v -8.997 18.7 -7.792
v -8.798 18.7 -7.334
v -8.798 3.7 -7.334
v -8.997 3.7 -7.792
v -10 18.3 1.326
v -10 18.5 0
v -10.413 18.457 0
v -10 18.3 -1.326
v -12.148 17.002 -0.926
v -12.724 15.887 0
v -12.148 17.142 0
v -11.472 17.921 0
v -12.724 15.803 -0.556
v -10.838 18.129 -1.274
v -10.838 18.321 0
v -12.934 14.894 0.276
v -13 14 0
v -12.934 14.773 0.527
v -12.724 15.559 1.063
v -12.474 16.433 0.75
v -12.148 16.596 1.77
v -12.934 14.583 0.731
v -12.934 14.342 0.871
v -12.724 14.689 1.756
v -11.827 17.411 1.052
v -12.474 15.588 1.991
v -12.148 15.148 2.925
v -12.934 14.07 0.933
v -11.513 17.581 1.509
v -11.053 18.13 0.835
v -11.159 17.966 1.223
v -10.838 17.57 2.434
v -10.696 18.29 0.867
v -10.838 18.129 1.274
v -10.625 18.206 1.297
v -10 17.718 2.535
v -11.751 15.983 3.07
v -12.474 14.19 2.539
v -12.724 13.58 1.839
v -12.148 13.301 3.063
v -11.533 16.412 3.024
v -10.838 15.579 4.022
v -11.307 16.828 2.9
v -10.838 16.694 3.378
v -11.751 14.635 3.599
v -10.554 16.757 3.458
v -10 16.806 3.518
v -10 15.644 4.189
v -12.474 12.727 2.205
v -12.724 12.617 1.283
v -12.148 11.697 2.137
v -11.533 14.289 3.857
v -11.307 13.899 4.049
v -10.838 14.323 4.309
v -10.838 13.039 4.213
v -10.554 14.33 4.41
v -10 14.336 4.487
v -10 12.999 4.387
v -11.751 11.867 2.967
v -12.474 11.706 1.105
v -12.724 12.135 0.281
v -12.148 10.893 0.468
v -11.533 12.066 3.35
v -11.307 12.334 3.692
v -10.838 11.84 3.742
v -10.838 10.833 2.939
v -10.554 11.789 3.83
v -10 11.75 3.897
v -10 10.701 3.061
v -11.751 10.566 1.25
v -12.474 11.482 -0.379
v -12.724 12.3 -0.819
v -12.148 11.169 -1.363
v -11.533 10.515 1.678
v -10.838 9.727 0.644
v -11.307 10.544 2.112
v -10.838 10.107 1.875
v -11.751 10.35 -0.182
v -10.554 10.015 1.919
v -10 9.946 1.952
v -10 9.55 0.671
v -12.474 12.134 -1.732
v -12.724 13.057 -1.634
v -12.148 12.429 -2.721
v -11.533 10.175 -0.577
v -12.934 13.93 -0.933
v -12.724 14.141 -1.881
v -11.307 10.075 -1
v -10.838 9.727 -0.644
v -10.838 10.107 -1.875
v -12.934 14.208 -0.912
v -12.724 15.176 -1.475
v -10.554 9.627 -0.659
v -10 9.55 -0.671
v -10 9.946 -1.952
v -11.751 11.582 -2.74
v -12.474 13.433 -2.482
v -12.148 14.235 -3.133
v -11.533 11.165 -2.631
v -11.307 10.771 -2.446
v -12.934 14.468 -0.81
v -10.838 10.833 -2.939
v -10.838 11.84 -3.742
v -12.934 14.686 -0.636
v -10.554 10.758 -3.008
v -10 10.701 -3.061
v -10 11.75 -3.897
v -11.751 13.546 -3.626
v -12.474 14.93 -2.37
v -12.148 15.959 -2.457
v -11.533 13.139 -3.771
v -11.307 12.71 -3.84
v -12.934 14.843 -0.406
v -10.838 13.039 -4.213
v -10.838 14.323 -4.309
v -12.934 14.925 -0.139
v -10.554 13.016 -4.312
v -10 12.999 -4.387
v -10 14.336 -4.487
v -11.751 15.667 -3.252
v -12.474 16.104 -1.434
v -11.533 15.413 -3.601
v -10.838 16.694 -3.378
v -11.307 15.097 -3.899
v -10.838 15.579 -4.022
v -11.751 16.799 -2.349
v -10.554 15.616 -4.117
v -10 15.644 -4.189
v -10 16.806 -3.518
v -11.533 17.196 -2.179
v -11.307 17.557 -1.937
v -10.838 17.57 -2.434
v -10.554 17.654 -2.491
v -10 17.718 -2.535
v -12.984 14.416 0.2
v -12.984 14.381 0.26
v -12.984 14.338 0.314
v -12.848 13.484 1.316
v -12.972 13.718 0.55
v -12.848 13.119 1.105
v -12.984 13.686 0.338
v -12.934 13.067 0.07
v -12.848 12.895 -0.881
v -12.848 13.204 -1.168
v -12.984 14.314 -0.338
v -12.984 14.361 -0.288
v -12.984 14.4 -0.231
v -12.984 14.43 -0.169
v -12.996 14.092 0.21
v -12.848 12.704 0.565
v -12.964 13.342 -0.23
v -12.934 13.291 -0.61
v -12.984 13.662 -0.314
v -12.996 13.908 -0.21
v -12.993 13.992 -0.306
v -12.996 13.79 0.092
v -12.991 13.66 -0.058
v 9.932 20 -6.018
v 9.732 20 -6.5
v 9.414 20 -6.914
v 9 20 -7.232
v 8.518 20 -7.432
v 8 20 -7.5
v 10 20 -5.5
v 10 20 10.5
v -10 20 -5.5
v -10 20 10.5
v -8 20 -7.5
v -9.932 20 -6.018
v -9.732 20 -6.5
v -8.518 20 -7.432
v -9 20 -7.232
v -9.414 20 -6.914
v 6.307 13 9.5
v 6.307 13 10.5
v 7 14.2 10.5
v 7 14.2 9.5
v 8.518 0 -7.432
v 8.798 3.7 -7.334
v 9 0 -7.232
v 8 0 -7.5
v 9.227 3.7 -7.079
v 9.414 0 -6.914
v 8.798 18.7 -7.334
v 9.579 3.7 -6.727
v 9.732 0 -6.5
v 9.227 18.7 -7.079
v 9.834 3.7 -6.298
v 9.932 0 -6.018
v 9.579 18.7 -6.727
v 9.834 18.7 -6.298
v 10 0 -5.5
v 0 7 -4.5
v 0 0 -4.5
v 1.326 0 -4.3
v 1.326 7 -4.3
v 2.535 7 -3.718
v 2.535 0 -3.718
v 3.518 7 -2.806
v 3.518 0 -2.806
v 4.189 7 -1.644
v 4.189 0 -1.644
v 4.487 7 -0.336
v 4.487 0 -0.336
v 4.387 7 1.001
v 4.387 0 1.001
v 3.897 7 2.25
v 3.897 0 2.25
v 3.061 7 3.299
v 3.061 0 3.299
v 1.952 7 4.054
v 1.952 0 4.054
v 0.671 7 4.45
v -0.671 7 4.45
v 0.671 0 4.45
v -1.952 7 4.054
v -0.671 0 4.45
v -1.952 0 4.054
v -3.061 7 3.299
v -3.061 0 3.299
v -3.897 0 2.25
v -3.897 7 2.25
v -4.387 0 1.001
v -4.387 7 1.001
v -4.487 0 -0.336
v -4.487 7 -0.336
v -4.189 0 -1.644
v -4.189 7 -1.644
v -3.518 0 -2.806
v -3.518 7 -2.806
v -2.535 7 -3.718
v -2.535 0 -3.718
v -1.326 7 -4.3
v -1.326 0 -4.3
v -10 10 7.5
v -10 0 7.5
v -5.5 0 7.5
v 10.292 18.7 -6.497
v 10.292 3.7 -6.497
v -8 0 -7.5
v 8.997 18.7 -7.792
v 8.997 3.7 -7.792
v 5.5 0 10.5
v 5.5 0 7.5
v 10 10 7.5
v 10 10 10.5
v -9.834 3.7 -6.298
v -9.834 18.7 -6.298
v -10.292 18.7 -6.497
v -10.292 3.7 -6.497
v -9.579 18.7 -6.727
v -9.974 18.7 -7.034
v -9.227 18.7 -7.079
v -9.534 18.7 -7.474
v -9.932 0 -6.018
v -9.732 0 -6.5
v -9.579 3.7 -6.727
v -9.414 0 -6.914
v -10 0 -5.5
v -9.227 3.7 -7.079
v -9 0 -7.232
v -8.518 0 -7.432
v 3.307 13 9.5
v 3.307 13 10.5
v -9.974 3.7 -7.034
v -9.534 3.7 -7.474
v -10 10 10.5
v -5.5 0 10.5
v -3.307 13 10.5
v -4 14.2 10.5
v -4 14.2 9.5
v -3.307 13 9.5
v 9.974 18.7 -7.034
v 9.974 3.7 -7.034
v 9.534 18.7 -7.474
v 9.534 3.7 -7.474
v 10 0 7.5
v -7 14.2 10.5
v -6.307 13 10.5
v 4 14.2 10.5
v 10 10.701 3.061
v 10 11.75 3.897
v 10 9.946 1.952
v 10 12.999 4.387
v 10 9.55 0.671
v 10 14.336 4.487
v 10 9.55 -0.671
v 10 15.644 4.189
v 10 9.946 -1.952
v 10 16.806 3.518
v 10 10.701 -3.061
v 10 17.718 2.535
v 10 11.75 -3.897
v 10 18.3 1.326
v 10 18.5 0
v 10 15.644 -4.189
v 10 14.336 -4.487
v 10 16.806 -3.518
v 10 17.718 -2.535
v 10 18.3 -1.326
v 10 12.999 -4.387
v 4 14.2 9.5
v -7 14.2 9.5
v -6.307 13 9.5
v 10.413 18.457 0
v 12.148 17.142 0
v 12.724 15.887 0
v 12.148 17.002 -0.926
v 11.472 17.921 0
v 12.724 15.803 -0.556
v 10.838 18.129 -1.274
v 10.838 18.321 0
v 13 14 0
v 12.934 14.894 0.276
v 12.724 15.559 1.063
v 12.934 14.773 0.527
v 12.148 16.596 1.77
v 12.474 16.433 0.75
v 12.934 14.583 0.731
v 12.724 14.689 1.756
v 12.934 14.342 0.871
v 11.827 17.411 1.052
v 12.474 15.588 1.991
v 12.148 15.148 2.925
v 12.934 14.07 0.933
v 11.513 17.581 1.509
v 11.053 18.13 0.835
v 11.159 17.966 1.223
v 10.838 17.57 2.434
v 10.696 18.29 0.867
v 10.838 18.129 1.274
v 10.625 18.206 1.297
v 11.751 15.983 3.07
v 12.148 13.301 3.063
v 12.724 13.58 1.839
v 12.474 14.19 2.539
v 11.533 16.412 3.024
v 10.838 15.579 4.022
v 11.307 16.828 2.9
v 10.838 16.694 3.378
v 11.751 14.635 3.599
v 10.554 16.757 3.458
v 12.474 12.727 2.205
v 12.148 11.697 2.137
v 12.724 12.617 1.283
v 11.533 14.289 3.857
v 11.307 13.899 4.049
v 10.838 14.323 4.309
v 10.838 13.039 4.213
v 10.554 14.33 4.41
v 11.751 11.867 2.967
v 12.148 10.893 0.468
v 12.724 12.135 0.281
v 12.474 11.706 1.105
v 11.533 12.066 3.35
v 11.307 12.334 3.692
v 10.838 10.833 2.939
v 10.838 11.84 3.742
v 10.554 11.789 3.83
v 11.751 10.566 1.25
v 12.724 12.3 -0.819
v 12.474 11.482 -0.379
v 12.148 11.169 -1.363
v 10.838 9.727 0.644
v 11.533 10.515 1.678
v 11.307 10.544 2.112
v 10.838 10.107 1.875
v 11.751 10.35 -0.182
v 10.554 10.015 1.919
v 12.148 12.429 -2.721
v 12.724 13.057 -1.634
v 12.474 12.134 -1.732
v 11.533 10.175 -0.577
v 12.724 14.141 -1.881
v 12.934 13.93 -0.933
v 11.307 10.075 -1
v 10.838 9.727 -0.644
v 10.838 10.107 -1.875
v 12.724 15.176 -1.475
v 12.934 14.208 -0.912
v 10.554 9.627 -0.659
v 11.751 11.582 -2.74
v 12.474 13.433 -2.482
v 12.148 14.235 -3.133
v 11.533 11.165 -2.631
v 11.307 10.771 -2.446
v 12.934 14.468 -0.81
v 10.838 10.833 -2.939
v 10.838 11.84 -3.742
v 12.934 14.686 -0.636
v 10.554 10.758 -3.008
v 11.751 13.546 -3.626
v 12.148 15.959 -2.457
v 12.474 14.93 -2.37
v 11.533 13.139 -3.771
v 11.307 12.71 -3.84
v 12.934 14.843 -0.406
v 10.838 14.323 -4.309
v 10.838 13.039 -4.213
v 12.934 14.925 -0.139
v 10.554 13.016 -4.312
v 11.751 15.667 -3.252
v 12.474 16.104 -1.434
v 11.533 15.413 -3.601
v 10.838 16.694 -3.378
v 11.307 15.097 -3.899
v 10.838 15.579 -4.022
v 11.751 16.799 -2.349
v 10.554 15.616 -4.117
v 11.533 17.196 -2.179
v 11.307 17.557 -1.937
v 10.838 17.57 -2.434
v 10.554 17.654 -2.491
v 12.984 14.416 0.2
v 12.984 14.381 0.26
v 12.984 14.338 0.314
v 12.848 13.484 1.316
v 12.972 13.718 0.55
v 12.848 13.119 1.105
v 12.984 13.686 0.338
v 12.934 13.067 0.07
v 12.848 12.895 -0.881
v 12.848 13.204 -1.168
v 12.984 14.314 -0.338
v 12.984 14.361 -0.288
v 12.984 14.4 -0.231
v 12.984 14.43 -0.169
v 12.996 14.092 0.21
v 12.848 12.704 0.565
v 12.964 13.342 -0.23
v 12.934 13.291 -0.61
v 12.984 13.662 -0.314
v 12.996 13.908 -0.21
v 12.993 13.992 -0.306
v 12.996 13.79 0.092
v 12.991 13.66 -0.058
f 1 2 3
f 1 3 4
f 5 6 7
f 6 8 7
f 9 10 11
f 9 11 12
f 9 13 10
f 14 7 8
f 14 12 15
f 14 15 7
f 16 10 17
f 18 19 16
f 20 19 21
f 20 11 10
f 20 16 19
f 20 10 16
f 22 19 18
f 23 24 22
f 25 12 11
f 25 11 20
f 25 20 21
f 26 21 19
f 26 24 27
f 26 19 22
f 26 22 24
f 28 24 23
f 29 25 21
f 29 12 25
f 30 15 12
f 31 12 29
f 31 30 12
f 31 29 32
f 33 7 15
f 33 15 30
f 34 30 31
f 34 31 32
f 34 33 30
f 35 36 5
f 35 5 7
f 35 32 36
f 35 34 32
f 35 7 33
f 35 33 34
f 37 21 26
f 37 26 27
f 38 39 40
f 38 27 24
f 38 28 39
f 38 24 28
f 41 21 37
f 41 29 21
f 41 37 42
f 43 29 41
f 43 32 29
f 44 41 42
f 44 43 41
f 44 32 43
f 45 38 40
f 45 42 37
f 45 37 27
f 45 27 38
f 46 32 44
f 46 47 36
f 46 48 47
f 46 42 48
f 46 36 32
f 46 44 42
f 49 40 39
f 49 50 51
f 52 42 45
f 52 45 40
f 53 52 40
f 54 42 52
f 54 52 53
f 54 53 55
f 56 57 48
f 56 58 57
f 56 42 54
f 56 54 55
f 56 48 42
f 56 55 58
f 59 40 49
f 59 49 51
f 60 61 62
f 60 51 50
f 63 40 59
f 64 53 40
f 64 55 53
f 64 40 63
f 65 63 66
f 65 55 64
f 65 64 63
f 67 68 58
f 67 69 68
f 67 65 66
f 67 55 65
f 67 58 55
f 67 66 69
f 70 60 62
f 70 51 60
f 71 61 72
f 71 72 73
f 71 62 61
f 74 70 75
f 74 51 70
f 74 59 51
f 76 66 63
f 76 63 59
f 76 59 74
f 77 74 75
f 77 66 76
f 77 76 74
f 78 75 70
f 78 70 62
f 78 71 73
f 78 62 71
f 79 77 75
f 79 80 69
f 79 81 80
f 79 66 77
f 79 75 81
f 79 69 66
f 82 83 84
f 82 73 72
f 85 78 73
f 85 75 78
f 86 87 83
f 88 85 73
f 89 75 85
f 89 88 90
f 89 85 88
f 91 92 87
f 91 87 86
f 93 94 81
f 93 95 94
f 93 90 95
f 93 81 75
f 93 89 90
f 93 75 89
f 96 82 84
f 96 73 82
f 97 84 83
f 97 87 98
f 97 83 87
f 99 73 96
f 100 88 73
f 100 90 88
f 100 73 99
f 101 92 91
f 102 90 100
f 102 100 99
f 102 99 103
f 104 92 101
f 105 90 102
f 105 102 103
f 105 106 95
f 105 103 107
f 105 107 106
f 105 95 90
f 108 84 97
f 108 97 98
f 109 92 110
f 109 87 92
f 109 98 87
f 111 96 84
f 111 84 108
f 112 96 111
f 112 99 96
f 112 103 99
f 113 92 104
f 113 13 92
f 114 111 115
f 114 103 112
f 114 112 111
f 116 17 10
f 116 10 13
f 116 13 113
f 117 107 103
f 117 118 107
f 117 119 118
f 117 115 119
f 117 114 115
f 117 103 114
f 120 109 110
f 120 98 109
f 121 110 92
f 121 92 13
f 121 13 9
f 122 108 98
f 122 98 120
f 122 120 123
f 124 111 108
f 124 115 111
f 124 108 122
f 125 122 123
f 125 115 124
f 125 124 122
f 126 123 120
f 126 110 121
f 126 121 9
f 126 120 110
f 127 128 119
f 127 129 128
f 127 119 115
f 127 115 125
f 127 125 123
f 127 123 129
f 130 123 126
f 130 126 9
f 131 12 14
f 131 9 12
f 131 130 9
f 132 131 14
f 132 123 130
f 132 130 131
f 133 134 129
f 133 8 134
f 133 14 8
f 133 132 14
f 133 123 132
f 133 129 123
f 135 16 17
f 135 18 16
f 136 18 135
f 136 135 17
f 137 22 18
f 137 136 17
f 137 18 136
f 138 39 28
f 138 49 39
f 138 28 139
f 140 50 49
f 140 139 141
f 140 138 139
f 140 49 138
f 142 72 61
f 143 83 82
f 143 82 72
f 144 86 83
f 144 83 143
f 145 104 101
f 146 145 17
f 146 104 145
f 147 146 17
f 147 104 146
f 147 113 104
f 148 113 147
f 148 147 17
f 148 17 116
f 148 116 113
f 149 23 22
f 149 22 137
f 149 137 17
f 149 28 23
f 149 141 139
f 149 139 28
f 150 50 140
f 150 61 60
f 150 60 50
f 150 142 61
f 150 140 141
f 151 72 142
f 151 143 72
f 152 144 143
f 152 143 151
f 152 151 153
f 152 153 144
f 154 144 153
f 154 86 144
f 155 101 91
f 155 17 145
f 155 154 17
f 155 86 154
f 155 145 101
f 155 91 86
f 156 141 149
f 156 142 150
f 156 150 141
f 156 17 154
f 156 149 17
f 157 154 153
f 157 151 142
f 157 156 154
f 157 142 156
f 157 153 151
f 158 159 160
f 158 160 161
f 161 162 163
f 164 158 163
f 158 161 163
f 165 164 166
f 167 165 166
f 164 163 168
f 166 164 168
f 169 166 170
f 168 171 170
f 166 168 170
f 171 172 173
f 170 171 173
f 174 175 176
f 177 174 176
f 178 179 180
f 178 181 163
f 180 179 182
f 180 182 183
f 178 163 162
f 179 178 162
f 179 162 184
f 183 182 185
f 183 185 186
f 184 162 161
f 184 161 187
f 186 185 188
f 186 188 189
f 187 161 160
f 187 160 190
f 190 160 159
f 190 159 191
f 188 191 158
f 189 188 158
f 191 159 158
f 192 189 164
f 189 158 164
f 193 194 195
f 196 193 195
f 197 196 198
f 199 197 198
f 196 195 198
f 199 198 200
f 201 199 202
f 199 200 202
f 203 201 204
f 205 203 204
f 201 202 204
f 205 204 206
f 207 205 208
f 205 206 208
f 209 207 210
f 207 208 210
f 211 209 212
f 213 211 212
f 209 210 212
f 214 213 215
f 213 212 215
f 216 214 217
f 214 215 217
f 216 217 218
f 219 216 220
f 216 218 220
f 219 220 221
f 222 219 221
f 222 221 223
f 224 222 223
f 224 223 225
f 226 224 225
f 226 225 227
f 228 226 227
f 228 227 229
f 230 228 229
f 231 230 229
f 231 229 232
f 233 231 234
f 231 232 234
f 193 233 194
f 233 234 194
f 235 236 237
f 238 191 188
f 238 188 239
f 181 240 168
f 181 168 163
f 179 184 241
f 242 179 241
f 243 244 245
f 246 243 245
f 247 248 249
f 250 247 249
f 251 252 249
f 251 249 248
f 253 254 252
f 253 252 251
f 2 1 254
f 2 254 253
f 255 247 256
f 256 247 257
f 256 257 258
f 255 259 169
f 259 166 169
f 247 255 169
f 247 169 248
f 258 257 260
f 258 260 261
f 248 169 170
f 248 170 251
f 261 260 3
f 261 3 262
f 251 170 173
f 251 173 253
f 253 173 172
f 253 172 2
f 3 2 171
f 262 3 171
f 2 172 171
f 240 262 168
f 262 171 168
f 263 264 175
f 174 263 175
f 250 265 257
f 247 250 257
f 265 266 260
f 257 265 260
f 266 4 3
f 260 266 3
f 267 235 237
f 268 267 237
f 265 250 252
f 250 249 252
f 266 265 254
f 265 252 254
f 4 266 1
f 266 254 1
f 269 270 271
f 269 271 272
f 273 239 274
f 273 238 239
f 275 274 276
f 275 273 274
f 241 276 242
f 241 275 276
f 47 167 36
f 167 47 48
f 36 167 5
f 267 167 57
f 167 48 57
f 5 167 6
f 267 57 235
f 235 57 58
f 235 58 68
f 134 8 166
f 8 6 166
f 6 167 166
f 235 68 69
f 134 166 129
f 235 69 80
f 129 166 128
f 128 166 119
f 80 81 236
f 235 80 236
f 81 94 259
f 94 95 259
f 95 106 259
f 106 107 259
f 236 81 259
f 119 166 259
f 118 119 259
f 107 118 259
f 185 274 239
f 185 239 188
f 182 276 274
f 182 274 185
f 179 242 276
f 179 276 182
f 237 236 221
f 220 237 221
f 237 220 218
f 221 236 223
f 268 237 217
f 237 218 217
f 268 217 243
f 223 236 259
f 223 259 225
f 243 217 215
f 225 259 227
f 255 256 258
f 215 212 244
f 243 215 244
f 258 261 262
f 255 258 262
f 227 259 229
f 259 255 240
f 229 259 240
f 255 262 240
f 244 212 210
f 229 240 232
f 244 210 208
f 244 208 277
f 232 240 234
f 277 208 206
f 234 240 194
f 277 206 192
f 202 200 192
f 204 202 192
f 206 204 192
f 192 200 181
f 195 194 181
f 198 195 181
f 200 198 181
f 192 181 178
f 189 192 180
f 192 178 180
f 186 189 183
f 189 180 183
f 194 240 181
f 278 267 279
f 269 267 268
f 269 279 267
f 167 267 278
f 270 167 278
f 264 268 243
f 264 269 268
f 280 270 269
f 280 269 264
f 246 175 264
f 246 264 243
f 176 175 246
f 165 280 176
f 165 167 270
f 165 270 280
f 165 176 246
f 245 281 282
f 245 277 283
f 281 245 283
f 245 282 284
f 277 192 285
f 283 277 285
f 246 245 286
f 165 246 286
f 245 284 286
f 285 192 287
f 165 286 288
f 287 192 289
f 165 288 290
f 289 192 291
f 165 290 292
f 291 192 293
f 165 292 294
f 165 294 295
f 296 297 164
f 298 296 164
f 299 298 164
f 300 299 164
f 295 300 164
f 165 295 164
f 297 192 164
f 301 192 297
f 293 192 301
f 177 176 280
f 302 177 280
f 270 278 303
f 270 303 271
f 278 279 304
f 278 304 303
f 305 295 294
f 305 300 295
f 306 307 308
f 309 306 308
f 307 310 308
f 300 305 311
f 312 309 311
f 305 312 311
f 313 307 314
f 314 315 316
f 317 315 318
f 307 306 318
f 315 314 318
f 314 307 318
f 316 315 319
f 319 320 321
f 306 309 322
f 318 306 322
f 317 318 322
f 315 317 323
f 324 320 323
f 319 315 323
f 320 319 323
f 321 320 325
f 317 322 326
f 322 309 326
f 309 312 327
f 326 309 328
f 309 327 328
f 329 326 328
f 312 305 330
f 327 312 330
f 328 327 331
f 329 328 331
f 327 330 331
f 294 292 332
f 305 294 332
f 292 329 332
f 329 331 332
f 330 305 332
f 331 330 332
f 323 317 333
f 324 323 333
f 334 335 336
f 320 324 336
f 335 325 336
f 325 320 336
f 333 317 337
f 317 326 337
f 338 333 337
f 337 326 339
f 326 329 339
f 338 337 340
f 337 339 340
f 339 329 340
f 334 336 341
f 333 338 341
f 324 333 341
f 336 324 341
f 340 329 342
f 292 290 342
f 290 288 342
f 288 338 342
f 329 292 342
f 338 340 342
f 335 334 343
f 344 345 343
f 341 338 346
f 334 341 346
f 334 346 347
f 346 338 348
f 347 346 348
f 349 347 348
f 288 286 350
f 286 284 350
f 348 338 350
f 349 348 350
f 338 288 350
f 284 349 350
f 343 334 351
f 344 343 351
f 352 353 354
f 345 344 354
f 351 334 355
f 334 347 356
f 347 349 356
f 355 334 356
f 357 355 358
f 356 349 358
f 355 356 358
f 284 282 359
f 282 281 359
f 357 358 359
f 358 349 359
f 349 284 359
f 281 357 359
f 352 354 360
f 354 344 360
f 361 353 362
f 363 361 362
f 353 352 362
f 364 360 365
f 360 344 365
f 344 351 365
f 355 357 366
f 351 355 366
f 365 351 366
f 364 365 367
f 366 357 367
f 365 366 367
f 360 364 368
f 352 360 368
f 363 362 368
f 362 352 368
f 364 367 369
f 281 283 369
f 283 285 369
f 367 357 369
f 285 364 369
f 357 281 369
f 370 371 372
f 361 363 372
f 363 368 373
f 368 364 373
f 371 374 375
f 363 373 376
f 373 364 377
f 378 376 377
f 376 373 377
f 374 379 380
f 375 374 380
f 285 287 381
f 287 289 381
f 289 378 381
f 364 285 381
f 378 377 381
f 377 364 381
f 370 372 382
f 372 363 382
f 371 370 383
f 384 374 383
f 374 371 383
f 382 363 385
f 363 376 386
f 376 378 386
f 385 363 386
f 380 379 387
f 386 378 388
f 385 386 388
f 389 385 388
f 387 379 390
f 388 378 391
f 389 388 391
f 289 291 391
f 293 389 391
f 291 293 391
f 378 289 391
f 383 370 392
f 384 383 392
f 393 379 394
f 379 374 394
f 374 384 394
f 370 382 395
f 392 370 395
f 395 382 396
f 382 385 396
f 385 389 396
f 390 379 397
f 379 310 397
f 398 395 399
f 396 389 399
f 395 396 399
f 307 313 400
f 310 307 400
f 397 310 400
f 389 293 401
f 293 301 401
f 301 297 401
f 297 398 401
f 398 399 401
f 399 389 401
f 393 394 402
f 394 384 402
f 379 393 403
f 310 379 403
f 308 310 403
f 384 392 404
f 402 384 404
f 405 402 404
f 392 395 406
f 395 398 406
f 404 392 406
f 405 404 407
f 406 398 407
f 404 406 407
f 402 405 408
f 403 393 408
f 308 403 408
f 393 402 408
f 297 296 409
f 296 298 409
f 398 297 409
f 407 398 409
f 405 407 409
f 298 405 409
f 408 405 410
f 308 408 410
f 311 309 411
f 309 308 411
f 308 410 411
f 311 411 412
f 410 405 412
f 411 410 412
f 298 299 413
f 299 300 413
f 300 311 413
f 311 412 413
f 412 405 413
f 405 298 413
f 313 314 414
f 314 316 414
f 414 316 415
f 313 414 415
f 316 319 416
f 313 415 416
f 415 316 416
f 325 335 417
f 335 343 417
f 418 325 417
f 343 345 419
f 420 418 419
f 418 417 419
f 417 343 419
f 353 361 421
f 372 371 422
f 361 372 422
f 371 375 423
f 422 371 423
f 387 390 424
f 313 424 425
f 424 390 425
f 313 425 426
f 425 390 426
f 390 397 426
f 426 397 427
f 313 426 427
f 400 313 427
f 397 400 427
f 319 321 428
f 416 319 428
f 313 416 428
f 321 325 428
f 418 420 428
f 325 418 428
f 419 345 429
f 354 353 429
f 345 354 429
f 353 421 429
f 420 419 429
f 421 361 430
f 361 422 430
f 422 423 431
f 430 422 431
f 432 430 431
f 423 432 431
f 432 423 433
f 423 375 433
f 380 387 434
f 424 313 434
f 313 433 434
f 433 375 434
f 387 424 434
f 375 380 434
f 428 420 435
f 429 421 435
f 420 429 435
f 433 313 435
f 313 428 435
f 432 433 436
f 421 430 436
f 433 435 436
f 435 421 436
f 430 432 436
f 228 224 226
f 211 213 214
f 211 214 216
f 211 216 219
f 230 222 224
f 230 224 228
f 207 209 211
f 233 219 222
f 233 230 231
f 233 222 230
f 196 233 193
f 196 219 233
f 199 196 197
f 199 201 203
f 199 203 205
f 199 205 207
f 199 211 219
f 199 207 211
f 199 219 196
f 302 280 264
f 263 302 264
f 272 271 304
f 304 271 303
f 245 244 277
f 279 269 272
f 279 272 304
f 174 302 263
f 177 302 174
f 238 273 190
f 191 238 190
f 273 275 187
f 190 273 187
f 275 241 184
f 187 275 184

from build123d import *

# Parameters (mm, degrees)
SKETCH1_W           = 20
SKETCH1_H           = 15
BOSS_EXTRUDE1_DEPTH = 20
SKETCH2_R           = 4.5
CUT_EXTRUDE1_DEPTH  = 7
BOSS_EXTRUDE2_DEPTH = 3
CUT_EXTRUDE4_DEPTH  = 1
FILLET1_R           = 2
WRAP1_SECTION_W     = 0.5
WRAP1_SECTION_H     = 15
WRAP1_ANGLE         = 42.971834635


# Read off the part's stored shape, not the designer's step: Dome1
with BuildPart() as part:
    # Sketch1 → Boss-Extrude1 (new body)
    with BuildSketch(Plane(origin=(0, 0, 0), x_dir=(1, 0, 0), z_dir=(0, 1, 0))):
        Rectangle(SKETCH1_W, SKETCH1_H)
    extrude(amount=BOSS_EXTRUDE1_DEPTH)

    # Sketch2 → Cut-Extrude1 (cut)
    with BuildSketch(Plane.XZ):
        with Locations(Location((0, 0, 0), (0, 0, 270))):
            Circle(SKETCH2_R)
    extrude(amount=-CUT_EXTRUDE1_DEPTH, mode=Mode.SUBTRACT)

    # Sketch3 → Boss-Extrude2 (add)
    with BuildSketch(Plane.XY.offset(7.5)):
        Polygon((-10, 20), (-10, 10), (-5.5, 0), (5.5, 0), (10, 10), (10, 20), align=None)
    extrude(amount=BOSS_EXTRUDE2_DEPTH)

    # Sketch5 → Cut-Extrude4 (cut)
    with BuildSketch(Plane.XY.offset(10.5)):
        Polygon((-7, 14.2), (-4, 14.2), (-3.307179677, 13), (-6.307179677, 13), align=None)
    cut_extrude4 = extrude(amount=-CUT_EXTRUDE4_DEPTH, mode=Mode.SUBTRACT)

    # Mirror2: Cut-Extrude4 across plane
    add(cut_extrude4.mirror(Plane(origin=(0, 0, 0), x_dir=(0, 0, 1), z_dir=(1, 0, 0))), mode=Mode.SUBTRACT)

    # Dome1 outline → Dome1 (revolve)
    with BuildSketch(Plane(origin=(0, 14, 0), x_dir=(0, 1, 0), z_dir=(0, 0, -1))):
        with BuildLine():
            Line((0, -9.9999999), (0, -13))
            add(Edge.make_bspline(
                [(0, -13), (4.5, -13), (4.5, -10)],
                knots=[4.71238898, 4.71238898, 4.71238898, 6.283185307, 6.283185307, 6.283185307], degree=2, weights=[1, 0.707106781, 1]))
            Line((4.5, -10), (0, -9.9999999))
        make_face()
    dome1 = revolve(axis=Axis((0, 14, 0), (1, 0, 0)))

    # Mirror7: Dome1 across plane
    add(dome1.mirror(Plane(origin=(0, 0, 0), x_dir=(0, 0, 1), z_dir=(1, 0, 0))))

    # Fillet1
    fillet1_edges = [part.edges().sort_by_distance(p)[0] for p in [
        (-10, 10, -7.5),
        (10, 10, -7.5),
    ]]
    fillet(fillet1_edges, radius=FILLET1_R)

    # Wrap1 section (on wrap section) → Wrap1 (revolve)
    with BuildSketch(Plane(origin=(8, 0, -5.5), x_dir=(0.9169620384790573, 0, -0.39897446032087286), z_dir=(0.39897446032087286, 0, 0.9169620384790573))):
        with Locations((2.25, 11.2)):
            Rectangle(WRAP1_SECTION_W, WRAP1_SECTION_H)
    wrap1 = revolve(axis=Axis((8, 0, -5.5), (0, 1, 0)), revolution_arc=WRAP1_ANGLE)

    # Mirror9: Wrap1 across plane
    add(wrap1.mirror(Plane(origin=(0, 0, 0), x_dir=(0, 0, 1), z_dir=(1, 0, 0))))


solid = part.part
